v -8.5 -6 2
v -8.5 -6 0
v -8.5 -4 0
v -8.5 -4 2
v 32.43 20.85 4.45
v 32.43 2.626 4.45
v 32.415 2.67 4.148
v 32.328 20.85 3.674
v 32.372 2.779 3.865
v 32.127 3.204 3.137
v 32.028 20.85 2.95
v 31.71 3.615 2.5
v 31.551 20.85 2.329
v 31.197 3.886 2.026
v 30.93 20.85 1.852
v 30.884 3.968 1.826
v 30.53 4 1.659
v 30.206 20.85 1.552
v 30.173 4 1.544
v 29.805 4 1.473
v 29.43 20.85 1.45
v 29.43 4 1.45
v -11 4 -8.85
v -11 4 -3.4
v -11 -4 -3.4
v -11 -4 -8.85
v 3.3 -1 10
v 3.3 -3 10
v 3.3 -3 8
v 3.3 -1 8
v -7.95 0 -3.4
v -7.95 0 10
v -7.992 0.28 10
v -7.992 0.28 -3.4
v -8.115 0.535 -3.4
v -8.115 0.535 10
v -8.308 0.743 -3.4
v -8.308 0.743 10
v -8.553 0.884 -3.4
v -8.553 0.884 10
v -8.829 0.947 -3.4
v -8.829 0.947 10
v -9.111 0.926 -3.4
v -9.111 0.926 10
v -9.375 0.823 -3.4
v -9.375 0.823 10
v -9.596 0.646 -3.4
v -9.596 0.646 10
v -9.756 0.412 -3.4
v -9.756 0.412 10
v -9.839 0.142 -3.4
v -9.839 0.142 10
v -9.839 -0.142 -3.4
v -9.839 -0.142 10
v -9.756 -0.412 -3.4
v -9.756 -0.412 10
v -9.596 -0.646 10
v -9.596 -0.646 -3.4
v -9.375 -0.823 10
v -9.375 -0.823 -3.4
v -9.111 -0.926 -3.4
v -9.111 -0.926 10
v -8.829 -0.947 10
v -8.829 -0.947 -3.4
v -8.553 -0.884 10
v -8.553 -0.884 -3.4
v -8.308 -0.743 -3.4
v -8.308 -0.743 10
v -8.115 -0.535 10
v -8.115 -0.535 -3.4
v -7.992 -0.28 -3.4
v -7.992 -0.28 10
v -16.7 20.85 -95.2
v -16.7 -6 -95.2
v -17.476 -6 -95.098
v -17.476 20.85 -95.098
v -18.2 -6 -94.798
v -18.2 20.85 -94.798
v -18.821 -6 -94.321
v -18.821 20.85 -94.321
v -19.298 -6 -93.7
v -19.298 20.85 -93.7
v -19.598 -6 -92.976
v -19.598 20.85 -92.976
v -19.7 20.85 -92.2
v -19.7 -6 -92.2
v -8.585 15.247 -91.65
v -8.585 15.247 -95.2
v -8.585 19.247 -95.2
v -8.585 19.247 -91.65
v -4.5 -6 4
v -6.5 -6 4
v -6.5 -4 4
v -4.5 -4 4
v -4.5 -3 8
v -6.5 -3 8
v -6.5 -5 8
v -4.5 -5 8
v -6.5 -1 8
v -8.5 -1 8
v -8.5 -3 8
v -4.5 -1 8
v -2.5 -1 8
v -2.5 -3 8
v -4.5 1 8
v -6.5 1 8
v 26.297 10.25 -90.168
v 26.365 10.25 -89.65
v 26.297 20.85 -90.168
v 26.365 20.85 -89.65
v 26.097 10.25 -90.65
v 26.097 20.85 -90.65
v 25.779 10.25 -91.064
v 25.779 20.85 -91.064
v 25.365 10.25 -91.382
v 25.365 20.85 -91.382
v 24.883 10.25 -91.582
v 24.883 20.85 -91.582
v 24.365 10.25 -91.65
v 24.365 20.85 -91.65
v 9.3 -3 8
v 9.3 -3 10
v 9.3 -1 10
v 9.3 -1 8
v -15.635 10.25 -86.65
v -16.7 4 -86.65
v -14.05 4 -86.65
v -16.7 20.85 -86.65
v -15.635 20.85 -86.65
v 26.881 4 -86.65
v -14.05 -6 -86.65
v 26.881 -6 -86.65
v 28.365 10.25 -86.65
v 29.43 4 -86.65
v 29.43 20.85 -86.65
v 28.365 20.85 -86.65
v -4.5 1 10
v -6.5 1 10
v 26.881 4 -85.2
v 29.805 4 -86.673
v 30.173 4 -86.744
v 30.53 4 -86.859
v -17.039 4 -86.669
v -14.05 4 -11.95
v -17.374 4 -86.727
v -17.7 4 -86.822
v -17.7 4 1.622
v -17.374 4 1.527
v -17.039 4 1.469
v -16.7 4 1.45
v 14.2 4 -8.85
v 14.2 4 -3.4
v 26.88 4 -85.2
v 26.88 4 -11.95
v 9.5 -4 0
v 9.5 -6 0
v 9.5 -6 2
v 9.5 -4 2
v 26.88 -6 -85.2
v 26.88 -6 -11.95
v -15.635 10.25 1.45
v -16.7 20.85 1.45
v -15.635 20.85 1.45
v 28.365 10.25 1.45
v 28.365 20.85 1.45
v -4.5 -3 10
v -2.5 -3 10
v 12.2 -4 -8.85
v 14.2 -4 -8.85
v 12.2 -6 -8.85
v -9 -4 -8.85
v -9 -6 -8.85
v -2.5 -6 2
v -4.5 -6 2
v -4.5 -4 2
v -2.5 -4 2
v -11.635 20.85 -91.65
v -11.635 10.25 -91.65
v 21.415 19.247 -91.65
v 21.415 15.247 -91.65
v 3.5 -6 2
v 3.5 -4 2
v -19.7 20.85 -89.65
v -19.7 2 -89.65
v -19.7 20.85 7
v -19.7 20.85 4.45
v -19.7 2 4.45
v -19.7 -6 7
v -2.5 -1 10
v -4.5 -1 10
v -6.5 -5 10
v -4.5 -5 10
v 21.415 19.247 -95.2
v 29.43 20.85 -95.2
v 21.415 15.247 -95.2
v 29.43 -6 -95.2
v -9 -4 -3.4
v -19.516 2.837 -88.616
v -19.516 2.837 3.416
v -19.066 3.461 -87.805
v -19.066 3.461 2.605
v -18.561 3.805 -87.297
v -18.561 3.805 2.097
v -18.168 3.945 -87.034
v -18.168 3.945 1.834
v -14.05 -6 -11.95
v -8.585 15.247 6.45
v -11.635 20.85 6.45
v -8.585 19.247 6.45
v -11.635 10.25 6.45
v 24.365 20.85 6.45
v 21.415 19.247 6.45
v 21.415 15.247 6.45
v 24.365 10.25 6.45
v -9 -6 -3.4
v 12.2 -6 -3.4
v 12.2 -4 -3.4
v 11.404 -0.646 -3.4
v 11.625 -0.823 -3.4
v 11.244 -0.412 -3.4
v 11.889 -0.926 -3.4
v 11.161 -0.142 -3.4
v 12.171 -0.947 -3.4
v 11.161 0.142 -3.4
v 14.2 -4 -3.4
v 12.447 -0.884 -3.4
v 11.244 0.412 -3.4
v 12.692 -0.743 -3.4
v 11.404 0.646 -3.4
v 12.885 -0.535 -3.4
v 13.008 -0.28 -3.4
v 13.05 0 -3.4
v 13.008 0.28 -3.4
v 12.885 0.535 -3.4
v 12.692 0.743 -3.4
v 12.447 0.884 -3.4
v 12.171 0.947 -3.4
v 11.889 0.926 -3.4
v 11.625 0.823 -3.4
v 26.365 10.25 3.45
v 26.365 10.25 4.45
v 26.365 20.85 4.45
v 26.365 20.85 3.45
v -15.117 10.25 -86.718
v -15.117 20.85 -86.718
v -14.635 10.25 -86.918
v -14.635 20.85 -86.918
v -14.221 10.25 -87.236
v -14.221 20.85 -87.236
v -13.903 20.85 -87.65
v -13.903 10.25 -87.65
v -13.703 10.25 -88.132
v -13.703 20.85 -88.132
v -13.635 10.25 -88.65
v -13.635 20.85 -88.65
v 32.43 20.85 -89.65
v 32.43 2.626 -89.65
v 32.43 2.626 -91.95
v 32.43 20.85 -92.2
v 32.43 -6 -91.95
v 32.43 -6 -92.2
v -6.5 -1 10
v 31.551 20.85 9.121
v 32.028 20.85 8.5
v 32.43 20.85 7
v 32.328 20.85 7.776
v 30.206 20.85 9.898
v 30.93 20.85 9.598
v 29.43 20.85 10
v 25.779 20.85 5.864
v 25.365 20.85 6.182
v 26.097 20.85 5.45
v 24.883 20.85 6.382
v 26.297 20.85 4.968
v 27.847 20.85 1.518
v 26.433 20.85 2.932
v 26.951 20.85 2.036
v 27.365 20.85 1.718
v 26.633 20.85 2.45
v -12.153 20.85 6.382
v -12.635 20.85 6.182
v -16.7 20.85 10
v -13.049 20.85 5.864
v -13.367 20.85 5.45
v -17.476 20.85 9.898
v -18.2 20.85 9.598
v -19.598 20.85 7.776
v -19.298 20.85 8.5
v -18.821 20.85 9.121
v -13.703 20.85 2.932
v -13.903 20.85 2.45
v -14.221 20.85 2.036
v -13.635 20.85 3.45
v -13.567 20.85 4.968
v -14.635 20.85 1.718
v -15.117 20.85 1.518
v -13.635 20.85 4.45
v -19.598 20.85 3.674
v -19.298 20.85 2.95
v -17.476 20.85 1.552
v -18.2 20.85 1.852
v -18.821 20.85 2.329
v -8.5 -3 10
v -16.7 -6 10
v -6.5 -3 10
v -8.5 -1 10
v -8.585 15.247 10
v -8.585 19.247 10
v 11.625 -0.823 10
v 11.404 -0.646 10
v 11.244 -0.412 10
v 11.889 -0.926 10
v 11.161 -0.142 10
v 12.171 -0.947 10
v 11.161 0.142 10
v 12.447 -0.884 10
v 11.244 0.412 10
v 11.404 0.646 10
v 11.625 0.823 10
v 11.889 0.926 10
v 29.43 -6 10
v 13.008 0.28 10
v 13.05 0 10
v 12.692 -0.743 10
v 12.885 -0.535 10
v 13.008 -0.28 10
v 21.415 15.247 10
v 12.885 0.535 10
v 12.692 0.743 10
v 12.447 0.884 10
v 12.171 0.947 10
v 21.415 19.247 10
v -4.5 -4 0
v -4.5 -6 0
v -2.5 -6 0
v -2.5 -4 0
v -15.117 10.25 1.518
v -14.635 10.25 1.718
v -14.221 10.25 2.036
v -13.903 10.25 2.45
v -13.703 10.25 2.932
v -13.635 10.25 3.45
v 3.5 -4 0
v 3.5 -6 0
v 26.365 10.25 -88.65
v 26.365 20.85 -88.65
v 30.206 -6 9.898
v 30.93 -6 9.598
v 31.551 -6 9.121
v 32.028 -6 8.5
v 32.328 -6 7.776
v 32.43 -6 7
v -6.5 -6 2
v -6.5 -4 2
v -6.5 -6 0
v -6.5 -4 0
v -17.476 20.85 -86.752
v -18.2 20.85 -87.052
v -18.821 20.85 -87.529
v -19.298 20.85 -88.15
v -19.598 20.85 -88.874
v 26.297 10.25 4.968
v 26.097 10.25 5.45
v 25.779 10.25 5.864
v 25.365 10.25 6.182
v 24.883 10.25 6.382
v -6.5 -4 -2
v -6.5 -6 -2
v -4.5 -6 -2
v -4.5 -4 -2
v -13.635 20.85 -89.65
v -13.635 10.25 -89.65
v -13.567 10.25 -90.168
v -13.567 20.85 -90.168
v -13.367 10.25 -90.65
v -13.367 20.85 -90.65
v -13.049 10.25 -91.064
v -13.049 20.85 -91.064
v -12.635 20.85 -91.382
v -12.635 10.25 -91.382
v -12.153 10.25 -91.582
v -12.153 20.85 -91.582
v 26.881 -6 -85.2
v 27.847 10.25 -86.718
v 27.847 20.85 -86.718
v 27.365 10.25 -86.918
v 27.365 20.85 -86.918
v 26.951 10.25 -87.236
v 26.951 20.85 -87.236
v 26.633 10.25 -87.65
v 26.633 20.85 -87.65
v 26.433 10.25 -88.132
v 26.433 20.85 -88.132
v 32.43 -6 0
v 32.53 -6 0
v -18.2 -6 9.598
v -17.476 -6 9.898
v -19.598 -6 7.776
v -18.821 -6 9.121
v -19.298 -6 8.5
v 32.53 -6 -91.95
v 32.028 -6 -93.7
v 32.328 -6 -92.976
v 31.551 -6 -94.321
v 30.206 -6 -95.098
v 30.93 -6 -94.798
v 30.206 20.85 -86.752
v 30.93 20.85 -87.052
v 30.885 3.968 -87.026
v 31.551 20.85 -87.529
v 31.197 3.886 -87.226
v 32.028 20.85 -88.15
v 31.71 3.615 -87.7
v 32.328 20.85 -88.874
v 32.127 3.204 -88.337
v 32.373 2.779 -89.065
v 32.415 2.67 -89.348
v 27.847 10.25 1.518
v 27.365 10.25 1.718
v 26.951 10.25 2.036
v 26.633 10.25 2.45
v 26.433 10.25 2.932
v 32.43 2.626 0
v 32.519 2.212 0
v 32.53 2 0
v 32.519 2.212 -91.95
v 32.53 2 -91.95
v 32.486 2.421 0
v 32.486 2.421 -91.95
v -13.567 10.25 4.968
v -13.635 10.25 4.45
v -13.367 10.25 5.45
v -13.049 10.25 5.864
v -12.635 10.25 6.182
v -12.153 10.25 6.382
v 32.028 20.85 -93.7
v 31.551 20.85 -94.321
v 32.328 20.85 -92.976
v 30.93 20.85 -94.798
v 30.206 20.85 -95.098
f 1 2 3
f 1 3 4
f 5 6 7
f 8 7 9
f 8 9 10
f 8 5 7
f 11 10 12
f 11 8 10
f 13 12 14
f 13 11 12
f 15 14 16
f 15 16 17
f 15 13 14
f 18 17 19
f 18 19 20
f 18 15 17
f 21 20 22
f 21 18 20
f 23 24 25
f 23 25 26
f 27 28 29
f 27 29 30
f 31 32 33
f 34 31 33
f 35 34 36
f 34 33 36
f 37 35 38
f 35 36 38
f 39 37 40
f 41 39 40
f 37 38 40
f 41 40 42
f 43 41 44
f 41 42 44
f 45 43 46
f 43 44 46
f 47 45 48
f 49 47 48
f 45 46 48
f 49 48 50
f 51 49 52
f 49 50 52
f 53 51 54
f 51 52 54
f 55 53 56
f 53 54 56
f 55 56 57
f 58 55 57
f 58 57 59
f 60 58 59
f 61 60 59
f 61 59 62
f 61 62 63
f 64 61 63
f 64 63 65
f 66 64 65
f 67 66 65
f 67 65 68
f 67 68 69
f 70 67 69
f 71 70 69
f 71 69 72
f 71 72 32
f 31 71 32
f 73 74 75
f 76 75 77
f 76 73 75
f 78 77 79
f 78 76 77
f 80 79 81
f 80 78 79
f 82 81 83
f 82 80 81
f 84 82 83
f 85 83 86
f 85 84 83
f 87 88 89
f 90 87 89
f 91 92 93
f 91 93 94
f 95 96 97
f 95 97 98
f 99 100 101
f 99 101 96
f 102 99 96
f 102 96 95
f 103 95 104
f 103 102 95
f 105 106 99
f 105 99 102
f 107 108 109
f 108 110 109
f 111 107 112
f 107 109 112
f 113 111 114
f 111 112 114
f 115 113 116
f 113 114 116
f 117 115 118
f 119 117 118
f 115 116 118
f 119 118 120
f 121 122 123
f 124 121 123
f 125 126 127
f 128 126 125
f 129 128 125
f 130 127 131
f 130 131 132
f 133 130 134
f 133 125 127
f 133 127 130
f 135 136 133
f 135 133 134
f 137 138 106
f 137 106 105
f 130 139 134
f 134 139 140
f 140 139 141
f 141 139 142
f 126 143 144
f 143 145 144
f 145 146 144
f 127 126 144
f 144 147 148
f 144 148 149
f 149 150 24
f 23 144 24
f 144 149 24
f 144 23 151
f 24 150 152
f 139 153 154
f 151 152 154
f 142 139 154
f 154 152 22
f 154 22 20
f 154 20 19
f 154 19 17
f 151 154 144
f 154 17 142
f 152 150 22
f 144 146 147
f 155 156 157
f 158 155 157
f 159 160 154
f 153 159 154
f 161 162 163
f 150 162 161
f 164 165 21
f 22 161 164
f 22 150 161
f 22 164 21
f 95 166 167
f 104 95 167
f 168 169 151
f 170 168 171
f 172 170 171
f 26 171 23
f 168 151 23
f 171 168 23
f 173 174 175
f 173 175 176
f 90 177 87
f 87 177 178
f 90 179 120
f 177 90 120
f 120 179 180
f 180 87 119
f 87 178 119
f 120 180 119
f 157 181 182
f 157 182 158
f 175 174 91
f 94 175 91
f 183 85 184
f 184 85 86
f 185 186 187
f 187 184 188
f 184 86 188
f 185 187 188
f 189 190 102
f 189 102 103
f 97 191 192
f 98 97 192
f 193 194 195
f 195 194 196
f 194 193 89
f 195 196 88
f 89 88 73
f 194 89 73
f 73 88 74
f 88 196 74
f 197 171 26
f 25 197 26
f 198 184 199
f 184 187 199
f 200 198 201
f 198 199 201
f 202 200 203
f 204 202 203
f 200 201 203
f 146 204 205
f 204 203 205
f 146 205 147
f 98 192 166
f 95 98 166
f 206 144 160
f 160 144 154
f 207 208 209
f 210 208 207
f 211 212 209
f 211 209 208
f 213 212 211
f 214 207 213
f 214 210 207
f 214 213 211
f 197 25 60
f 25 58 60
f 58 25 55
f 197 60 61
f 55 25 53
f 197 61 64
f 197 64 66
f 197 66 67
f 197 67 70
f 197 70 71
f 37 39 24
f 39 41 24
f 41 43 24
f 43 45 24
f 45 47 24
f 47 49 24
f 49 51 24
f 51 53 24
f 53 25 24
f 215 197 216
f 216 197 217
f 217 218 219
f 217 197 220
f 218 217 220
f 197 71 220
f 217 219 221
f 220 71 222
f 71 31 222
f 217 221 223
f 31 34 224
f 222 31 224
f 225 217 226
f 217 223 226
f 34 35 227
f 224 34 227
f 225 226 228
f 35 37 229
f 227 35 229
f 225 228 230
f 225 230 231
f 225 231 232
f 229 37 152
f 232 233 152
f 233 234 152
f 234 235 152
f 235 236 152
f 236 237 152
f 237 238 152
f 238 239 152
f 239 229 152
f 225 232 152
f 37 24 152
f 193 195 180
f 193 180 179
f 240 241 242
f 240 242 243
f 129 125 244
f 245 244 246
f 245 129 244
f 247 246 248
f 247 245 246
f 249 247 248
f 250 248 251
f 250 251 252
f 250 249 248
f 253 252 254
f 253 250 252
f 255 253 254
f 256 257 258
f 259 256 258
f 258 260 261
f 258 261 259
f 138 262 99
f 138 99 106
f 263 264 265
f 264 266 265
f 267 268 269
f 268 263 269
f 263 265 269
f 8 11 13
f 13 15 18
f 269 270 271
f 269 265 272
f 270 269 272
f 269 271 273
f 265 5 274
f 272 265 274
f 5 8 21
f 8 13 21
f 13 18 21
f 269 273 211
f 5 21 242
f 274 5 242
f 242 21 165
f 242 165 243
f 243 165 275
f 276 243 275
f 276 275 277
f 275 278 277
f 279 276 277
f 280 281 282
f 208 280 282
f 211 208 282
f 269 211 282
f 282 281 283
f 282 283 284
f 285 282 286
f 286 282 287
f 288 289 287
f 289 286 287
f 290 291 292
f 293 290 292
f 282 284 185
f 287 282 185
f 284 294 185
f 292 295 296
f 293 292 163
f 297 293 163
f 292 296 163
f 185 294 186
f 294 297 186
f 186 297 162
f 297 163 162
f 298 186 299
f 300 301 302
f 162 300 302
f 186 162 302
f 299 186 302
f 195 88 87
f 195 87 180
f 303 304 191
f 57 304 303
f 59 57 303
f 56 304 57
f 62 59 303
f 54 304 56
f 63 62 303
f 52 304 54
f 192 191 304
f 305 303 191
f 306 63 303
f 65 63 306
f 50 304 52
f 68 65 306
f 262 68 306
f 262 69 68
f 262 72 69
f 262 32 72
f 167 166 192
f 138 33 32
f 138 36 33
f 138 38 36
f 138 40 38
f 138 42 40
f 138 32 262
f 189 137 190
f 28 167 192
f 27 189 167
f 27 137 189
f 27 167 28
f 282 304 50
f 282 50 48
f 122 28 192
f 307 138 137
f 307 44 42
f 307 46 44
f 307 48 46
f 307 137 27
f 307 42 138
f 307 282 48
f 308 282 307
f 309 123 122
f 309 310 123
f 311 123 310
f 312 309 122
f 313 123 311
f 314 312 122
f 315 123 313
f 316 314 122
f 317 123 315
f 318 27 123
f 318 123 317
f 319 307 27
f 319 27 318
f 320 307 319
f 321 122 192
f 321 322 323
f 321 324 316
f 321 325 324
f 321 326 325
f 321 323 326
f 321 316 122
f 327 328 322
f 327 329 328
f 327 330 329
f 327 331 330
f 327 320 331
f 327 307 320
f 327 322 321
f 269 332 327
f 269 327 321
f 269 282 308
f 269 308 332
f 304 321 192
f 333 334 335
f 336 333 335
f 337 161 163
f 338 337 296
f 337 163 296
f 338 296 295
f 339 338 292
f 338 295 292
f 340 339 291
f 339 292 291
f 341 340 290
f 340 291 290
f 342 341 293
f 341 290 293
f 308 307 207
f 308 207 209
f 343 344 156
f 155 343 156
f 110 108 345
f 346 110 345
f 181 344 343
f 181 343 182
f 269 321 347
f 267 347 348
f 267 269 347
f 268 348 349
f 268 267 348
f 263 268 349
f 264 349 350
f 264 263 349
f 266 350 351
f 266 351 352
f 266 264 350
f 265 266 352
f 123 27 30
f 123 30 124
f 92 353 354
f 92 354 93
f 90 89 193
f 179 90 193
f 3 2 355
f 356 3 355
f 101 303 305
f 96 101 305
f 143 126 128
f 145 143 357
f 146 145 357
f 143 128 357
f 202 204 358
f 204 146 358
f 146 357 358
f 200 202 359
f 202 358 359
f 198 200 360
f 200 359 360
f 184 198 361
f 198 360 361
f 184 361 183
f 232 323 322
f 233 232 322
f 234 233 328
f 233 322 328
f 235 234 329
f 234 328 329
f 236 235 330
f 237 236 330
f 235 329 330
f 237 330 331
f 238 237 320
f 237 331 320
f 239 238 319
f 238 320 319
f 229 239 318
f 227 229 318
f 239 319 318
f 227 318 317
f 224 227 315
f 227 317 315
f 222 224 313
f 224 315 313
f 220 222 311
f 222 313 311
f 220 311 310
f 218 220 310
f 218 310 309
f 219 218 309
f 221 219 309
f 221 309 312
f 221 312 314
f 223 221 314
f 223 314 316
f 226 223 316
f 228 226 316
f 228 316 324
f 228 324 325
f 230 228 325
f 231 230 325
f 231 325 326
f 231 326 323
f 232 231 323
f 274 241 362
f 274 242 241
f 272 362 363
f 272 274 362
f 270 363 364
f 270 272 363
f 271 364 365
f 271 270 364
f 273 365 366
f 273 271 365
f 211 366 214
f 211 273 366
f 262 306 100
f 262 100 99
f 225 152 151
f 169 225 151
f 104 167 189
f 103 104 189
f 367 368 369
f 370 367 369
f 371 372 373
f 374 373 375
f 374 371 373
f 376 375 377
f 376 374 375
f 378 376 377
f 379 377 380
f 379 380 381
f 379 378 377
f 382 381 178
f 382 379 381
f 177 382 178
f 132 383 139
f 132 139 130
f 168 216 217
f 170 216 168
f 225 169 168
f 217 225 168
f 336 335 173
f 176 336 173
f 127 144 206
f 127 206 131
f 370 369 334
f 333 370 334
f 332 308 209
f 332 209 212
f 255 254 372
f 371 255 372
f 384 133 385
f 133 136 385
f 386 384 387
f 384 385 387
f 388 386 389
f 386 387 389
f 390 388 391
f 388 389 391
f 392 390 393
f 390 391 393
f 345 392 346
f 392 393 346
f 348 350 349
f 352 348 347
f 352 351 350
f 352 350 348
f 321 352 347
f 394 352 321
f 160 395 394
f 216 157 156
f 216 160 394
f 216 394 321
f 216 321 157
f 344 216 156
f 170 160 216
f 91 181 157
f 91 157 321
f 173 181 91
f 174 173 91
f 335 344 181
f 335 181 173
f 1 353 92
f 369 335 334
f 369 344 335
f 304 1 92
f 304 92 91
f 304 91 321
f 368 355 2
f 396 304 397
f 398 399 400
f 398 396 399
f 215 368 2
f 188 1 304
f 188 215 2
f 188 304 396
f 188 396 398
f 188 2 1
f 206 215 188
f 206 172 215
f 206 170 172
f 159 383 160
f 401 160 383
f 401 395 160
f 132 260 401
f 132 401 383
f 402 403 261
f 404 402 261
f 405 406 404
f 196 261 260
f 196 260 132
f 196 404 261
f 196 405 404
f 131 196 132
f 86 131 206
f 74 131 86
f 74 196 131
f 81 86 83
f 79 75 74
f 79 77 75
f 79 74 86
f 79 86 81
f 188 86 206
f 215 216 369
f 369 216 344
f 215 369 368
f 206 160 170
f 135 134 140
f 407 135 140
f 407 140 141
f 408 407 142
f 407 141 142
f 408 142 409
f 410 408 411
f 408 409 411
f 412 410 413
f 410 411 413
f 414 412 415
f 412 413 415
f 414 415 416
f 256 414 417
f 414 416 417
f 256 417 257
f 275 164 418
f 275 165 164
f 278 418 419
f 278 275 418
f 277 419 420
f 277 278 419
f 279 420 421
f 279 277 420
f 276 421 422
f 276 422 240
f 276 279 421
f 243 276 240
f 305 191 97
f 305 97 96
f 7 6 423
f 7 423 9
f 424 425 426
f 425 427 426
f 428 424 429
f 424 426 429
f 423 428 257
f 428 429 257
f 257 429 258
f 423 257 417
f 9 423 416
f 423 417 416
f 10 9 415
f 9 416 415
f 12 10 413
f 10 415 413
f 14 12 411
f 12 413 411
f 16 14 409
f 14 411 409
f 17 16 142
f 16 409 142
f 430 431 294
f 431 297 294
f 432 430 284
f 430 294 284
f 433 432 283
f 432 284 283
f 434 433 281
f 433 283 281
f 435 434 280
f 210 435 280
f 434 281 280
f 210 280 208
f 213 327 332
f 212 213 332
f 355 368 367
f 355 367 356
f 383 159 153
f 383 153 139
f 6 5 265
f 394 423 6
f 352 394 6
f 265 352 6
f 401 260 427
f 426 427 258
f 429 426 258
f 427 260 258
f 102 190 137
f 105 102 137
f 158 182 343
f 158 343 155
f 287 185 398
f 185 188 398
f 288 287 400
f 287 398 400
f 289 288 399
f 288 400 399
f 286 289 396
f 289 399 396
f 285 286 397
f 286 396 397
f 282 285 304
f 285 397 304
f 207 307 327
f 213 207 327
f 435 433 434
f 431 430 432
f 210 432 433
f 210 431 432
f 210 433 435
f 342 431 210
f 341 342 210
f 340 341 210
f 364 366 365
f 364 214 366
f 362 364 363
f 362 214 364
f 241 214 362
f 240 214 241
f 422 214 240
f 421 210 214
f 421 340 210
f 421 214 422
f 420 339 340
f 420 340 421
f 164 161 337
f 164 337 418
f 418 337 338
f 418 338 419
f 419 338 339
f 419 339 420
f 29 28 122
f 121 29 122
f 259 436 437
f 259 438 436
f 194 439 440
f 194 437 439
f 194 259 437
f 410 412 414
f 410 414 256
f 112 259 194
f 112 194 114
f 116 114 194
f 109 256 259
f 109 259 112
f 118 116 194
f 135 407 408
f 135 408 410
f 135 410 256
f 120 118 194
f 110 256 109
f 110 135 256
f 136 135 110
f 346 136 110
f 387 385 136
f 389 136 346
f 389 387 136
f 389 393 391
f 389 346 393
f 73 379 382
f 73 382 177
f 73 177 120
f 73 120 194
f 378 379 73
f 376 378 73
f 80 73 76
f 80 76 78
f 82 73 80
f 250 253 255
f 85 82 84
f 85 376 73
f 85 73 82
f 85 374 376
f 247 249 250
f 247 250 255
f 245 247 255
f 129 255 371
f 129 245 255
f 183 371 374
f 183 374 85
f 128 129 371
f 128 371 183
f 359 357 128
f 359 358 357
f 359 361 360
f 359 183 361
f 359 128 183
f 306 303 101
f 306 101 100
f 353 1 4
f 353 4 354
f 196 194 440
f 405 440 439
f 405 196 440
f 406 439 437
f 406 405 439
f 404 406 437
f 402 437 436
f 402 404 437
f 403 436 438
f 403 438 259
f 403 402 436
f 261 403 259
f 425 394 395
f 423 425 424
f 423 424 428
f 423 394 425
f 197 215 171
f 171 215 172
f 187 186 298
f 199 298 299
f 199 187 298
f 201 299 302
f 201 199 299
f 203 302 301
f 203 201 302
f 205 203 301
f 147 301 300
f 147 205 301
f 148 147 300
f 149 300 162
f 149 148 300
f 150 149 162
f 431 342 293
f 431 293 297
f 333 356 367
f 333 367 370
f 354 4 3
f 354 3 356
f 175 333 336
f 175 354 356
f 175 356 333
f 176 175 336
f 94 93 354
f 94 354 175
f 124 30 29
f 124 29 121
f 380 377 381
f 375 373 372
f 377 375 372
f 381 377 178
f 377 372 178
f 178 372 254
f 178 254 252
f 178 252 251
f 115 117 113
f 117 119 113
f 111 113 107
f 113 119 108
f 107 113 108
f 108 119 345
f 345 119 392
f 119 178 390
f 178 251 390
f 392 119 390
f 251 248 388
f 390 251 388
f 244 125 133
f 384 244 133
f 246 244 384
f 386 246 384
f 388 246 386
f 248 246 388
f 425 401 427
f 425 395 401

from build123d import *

# Parameters (mm, degrees)
SKETCH_1_W               = 52.13
SKETCH_1_H               = 16.25
SKETCH_1_R               = 0.95
EXTRUDE_1_DEPTH          = 10
SKETCH_2_W               = 7.1
SKETCH_2_H               = 10
EXTRUDE_2_DEPTH          = 11.95
EXTRUDE_3_DEPTH          = 10.6
SKETCH_4_W               = 30
SKETCH_4_H               = 4
CUT_EXTRUDE_1_DEPTH      = 11
SKETCH_6_W               = 5.65
SKETCH_6_H               = 10
EXTRUDE_4_DEPTH          = 80
CUT_EXTRUDE_2_DEPTH      = 80
CUT_EXTRUDE_2_DEPTH_BACK = 6.25
SKETCH_7_W               = 52.13
SKETCH_7_H               = 1.45
SKETCH_7_H_2             = 1.85
SKETCH_8_W               = 11.056524021
SKETCH_8_H               = 11.95
CUT_EXTRUDE_3_DEPTH      = 103.005836269
SKETCH_9_W               = 3.1
SKETCH_9_H               = 10
EXTRUDE_5_DEPTH          = 25.2
SKETCH_10_W              = 2
SKETCH_10_H              = 2
EXTRUDE_6_DEPTH          = 8.85
SKETCH_11_W              = 40.93148405
SKETCH_11_H              = 1.45
CUT_EXTRUDE_4_DEPTH      = 103.005836269
SKETCH_12_W              = 5.73041858
SKETCH_12_H              = 11.95
EXTRUDE_7_DEPTH          = 10
FILLET_1_R               = 3
FILLET_2_R               = 2
SKETCH_13_R              = 1.05
CUT_EXTRUDE_5_DEPTH      = 105.087334213
FILLET_3_R               = 2
SKETCH_14_R              = 0.95
EXTRUDE_8_DEPTH          = 3.4
SKETCH_15_W              = 23.6
SKETCH_15_H              = 5.45
SKETCH_15_W_2            = 1.6
EXTRUDE_9_DEPTH          = 10
SKETCH_15_3_W            = 23.6
SKETCH_15_3_H            = 5.45
SKETCH_15_3_W_2          = 1.6
CUT_EXTRUDE_6_DEPTH      = 103.005836318
SKETCH_16_W              = 2
SKETCH_16_H              = 5.45
EXTRUDE_10_DEPTH         = 2
EXTRUDE_START            = -13.4
SKETCH_17_R              = 0.95
EXTRUDE_11_DEPTH         = 13.4
SKETCH_17_4_R            = 0.95
SKETCH_17_4_R_2          = 1.05
EXTRUDE_12_DEPTH         = 8.55
CUT_EXTRUDE_7_REACH      = 114.071
SKETCH_18_R              = 0.95
SKETCH_19_R              = 0.95
EXTRUDE_13_DEPTH         = 8.55
SKETCH_20_W              = 6
SKETCH_20_H              = 2
SKETCH_20_W_2            = 2
SKETCH_20_H_2            = 6
CUT_EXTRUDE_1_2_DEPTH    = 2
SKETCH_21_W              = 6
SKETCH_21_H              = 2
SKETCH_21_W_2            = 2
SKETCH_21_H_2            = 6
CUT_EXTRUDE_2_2_DEPTH    = 2


with BuildPart() as part:
    # 草图1 → 凸台-拉伸1 (new body)
    with BuildSketch(Plane.XY):
        with Locations((6.365, 2.125)):
            Rectangle(SKETCH_1_W, SKETCH_1_H)
        with Locations((-10.5, 0)):
            Circle(SKETCH_1_R, mode=Mode.SUBTRACT)
        with Locations(Location((10.5, 0, 0), (0, 0, 180))):
            Circle(SKETCH_1_R, mode=Mode.SUBTRACT)
    extrude_1 = extrude(amount=EXTRUDE_1_DEPTH)

    # 草图2 → 凸台-拉伸2 (add)
    with BuildSketch(Plane(origin=(0, 0, 0), x_dir=(-1, 0, 0), z_dir=(0, 0, -1))):
        with Locations((16.15, -1)):
            Rectangle(SKETCH_2_W, SKETCH_2_H)
        with Locations((-16.15, -1)):
            Rectangle(SKETCH_2_W, SKETCH_2_H)
    extrude_2 = extrude(amount=EXTRUDE_2_DEPTH)

    # 草图3 → 凸台-拉伸3 (add)
    with BuildSketch(Plane(origin=(0, 10.25, 0), x_dir=(1, 0, 0), z_dir=(0, 1, 0))):
        Polygon((32.43, -10), (-19.7, -10), (-19.7, -1.45), (-13.635, -1.45), (-13.635, -6.45), (26.365, -6.45), (26.365, -1.45), (32.43, -1.45), align=None)
    extrude_3 = extrude(amount=EXTRUDE_3_DEPTH)

    # 草图4 → Cut-Extrude 1 (cut)
    with BuildSketch(Plane.XY.offset(10)):
        with Locations((6.41520929, 17.24732554)):
            Rectangle(SKETCH_4_W, SKETCH_4_H)
    cut_extrude_1 = extrude(amount=-CUT_EXTRUDE_1_DEPTH, mode=Mode.SUBTRACT)

    # 草图6 → 凸台-拉伸4 (add)
    with BuildSketch(Plane(origin=(0, 0, -11.95), x_dir=(-1, 0, 0), z_dir=(0, 0, -1))):
        with Locations((16.875, -1)):
            Rectangle(SKETCH_6_W, SKETCH_6_H)
    extrude_4 = extrude(amount=EXTRUDE_4_DEPTH)

    # 镜向1: 凸台-拉伸2, 凸台-拉伸4 across plane
    add(extrude_2.mirror(Plane.ZY.offset(-6.41520929)))
    add(extrude_4.mirror(Plane.ZY.offset(-6.41520929)))

    # 镜向2: 凸台-拉伸1, 凸台-拉伸3, Cut-Extrude 1 across plane
    add(extrude_1.mirror(Plane.XY.offset(-42.6)))
    add(extrude_3.mirror(Plane.XY.offset(-42.6)))
    add(cut_extrude_1.mirror(Plane.XY.offset(-42.6)), mode=Mode.SUBTRACT)

    # 草图7 → Cut-Extrude 2 (cut, two sides: drawn at the far end of the back side and taken through both)
    with BuildSketch(Plane(origin=(0, 10.25, 0), x_dir=(1, 0, 0), z_dir=(0, 1, 0)).offset(-CUT_EXTRUDE_2_DEPTH_BACK)):
        with Locations((6.365, -0.725)):
            Rectangle(SKETCH_7_W, SKETCH_7_H)
        with Locations((6.365, 85.725)):
            Rectangle(SKETCH_7_W, SKETCH_7_H_2)
    extrude(amount=CUT_EXTRUDE_2_DEPTH + CUT_EXTRUDE_2_DEPTH_BACK, mode=Mode.SUBTRACT)

    # 草图8 → 切除-拉伸3 (cut, through all)
    with BuildSketch(Plane(origin=(0, 4, 0), x_dir=(1, 0, 0), z_dir=(0, 1, 0))):
        with Locations((-1.34131941, 5.975)):
            Rectangle(SKETCH_8_W, SKETCH_8_H)
    extrude(amount=-CUT_EXTRUDE_3_DEPTH, mode=Mode.SUBTRACT)

    # 草图9 → 凸台-拉伸5 (add)
    with BuildSketch(Plane.ZY.offset(-12.6)):
        with Locations((-10.4, -1)):
            Rectangle(SKETCH_9_W, SKETCH_9_H)
    extrude(amount=EXTRUDE_5_DEPTH)

    # 草图10 → 凸台-拉伸6 (add)
    with BuildSketch(Plane(origin=(0, 0, 0), x_dir=(-1, 0, 0), z_dir=(0, 0, -1))):
        with Locations((-11.6, -5)):
            Rectangle(SKETCH_10_W, SKETCH_10_H)
        with Locations((11.6, -5)):
            Rectangle(SKETCH_10_W, SKETCH_10_H)
    extrude(amount=EXTRUDE_6_DEPTH)

    # 草图11 → 切除-拉伸4 (cut, through all)
    with BuildSketch(Plane(origin=(0, 4, 0), x_dir=(1, 0, 0), z_dir=(0, 1, 0))):
        with Locations((6.415742025, 85.925)):
            Rectangle(SKETCH_11_W, SKETCH_11_H)
    extrude(amount=-CUT_EXTRUDE_4_DEPTH, mode=Mode.SUBTRACT)

    # 草图12 → 凸台-拉伸7 (add)
    with BuildSketch(Plane(origin=(0, 4, 0), x_dir=(1, 0, 0), z_dir=(0, 1, 0))):
        with Locations((22.56520929, 5.975)):
            Rectangle(SKETCH_12_W, SKETCH_12_H)
    extrude(amount=-EXTRUDE_7_DEPTH)

    # 圆角1
    fillet_1_edges = [part.edges().sort_by_distance(p)[0] for p in [
        (32.43, 7.425, 10),
        (-19.7, 7.425, -95.2),
        (32.43, 7.425, -95.2),
        (-19.7, 12.425, -86.65),
        (32.43, 12.425, -86.65),
        (-19.7, 7.425, 10),
        (-19.7, 12.425, 1.45),
        (32.43, 12.425, 1.45),
    ]]
    fillet(fillet_1_edges, radius=FILLET_1_R)

    # 圆角2
    fillet_2_edges = [part.edges().sort_by_distance(p)[0] for p in [
        (32.53041858, 4, -45.975),
        (-19.7, 4, -42.6),
    ]]
    fillet(fillet_2_edges, radius=FILLET_2_R)

    # 草图13 → 切除-拉伸5 (cut, through all)
    with BuildSketch(Plane(origin=(0, 0, 1.45), x_dir=(-1, 0, 0), z_dir=(0, 0, -1))):
        with Locations((0, 5.05)):
            Circle(SKETCH_13_R)
    extrude(amount=-CUT_EXTRUDE_5_DEPTH, mode=Mode.SUBTRACT)

    # 圆角3
    fillet_3_edges = [part.edges().sort_by_distance(p)[0] for p in [
        (-13.635, 15.55, -86.65),
        (-13.635, 15.55, -91.65),
        (26.365, 15.55, -91.65),
        (26.365, 15.55, -86.65),
        (26.365, 15.55, 1.45),
        (26.365, 15.55, 6.45),
        (-13.635, 15.55, 6.45),
        (-13.635, 15.55, 1.45),
    ]]
    fillet(fillet_3_edges, radius=FILLET_3_R)

    # 草图14 → 凸台-拉伸8 (add)
    with BuildSketch(Plane(origin=(0, 0, 0), x_dir=(-1, 0, 0), z_dir=(0, 0, -1))):
        Polygon((10.6, -4), (12.6, -4), (12.6, 4), (-12.6, 4), (-12.6, -4), (-10.6, -4), (-10.6, -6), (10.6, -6), align=None)
        with Locations((-10.5, 0)):
            Circle(SKETCH_14_R, mode=Mode.SUBTRACT)
        with Locations((10.5, 0)):
            Circle(SKETCH_14_R, mode=Mode.SUBTRACT)
    extrude(amount=EXTRUDE_8_DEPTH)

    # 草图15 → 凸台-拉伸9 (add, through all)
    with BuildSketch(Plane(origin=(0, 4, 0), x_dir=(1, 0, 0), z_dir=(0, 1, 0))):
        with Locations((0.8, 6.125)):
            Rectangle(SKETCH_15_W, SKETCH_15_H)
        with Locations((-11.8, 6.125)):
            Rectangle(SKETCH_15_W_2, SKETCH_15_H)
        with Locations((13.4, 6.125)):
            Rectangle(SKETCH_15_W_2, SKETCH_15_H)
    extrude(amount=-EXTRUDE_9_DEPTH)

    # 草图15<3> → 切除-拉伸6 (cut, through all)
    with BuildSketch(Plane(origin=(0, 4, 0), x_dir=(1, 0, 0), z_dir=(0, 1, 0))):
        with Locations((0.8, 6.125)):
            Rectangle(SKETCH_15_3_W, SKETCH_15_3_H)
        with Locations((13.4, 6.125)):
            Rectangle(SKETCH_15_3_W_2, SKETCH_15_3_H)
    extrude(amount=-CUT_EXTRUDE_6_DEPTH, mode=Mode.SUBTRACT)

    # 草图16 → 凸台-拉伸10 (add)
    with BuildSketch(Plane(origin=(0, -6, 0), x_dir=(-1, 0, 0), z_dir=(0, -1, 0))):
        with Locations((10, 6.125)):
            Rectangle(SKETCH_16_W, SKETCH_16_H)
        with Locations((-13.2, 6.125)):
            Rectangle(SKETCH_16_W, SKETCH_16_H)
    extrude(amount=-EXTRUDE_10_DEPTH)

    # 草图17 → 凸台-拉伸11 (add)
    with BuildSketch(Plane.XY.offset(10).offset(EXTRUDE_START)):
        with Locations((-10.5, 0)):
            Circle(SKETCH_17_R)
        with Locations(Location((10.5, 0, 0), (0, 0, 180))):
            Circle(SKETCH_17_R)
    extrude(amount=EXTRUDE_11_DEPTH)

    # 草图17<4> → 凸台-拉伸12 (add)
    with BuildSketch(Plane.XY.offset(10)):
        with Locations(Location((10.5, 0, 0), (0, 0, 180))):
            Circle(SKETCH_17_4_R)
        with Locations((0, 5.05)):
            Circle(SKETCH_17_4_R_2)
        with Locations((-10.5, 0)):
            Circle(SKETCH_17_4_R)
    extrude(amount=-EXTRUDE_12_DEPTH)

    # 草图18 → 切除-拉伸7 (cut, up to next)
    with BuildSketch(Plane.XY.offset(10), mode=Mode.PRIVATE) as cut_extrude_7_sk1:
        with Locations((12.1, 0)):
            Circle(SKETCH_18_R)
    cut_extrude_7_tool1 = extrude(cut_extrude_7_sk1.sketch, amount=-CUT_EXTRUDE_7_REACH, mode=Mode.PRIVATE) & part.part
    # 草图18 → 切除-拉伸7 (cut, up to next)
    with BuildSketch(Plane.XY.offset(10), mode=Mode.PRIVATE) as cut_extrude_7_sk2:
        with Locations((-8.9, 0)):
            Circle(SKETCH_18_R)
    cut_extrude_7_tool2 = extrude(cut_extrude_7_sk2.sketch, amount=-CUT_EXTRUDE_7_REACH, mode=Mode.PRIVATE) & part.part
    add(cut_extrude_7_tool1.solids().sort_by_distance((12.1, 0, 10))[0], mode=Mode.SUBTRACT)
    add(cut_extrude_7_tool2.solids().sort_by_distance((-8.9, 0, 10))[0], mode=Mode.SUBTRACT)

    # 草图19 → 凸台-拉伸13 (add, through all)
    with BuildSketch(Plane.XY.offset(-86.65)):
        with Locations((-10.5, 0)):
            Circle(SKETCH_19_R)
        with Locations((10.5, 0)):
            Circle(SKETCH_19_R)
    extrude(amount=-EXTRUDE_13_DEPTH)

    # 草图20 → Cut-Extrude 1 2 (cut)
    with BuildSketch(Plane.XZ.offset(6)):
        with Locations((-5.5, 1)):
            Rectangle(SKETCH_20_W, SKETCH_20_H)
        with Locations((-5.5, 1)):
            Rectangle(SKETCH_20_W_2, SKETCH_20_H_2)
        with Locations((6.5, 1)):
            Rectangle(SKETCH_20_W, SKETCH_20_H)
    extrude(amount=-CUT_EXTRUDE_1_2_DEPTH, mode=Mode.SUBTRACT)

    # 草图21 → Cut-Extrude 2 2 (cut)
    with BuildSketch(Plane.XY.offset(10)):
        with Locations((-5.5, -2)):
            Rectangle(SKETCH_21_W, SKETCH_21_H)
        with Locations((-5.5, -2)):
            Rectangle(SKETCH_21_W_2, SKETCH_21_H_2)
        with Locations((6.3, -2)):
            Rectangle(SKETCH_21_W, SKETCH_21_H)
    extrude(amount=-CUT_EXTRUDE_2_2_DEPTH, mode=Mode.SUBTRACT)


solid = part.part
